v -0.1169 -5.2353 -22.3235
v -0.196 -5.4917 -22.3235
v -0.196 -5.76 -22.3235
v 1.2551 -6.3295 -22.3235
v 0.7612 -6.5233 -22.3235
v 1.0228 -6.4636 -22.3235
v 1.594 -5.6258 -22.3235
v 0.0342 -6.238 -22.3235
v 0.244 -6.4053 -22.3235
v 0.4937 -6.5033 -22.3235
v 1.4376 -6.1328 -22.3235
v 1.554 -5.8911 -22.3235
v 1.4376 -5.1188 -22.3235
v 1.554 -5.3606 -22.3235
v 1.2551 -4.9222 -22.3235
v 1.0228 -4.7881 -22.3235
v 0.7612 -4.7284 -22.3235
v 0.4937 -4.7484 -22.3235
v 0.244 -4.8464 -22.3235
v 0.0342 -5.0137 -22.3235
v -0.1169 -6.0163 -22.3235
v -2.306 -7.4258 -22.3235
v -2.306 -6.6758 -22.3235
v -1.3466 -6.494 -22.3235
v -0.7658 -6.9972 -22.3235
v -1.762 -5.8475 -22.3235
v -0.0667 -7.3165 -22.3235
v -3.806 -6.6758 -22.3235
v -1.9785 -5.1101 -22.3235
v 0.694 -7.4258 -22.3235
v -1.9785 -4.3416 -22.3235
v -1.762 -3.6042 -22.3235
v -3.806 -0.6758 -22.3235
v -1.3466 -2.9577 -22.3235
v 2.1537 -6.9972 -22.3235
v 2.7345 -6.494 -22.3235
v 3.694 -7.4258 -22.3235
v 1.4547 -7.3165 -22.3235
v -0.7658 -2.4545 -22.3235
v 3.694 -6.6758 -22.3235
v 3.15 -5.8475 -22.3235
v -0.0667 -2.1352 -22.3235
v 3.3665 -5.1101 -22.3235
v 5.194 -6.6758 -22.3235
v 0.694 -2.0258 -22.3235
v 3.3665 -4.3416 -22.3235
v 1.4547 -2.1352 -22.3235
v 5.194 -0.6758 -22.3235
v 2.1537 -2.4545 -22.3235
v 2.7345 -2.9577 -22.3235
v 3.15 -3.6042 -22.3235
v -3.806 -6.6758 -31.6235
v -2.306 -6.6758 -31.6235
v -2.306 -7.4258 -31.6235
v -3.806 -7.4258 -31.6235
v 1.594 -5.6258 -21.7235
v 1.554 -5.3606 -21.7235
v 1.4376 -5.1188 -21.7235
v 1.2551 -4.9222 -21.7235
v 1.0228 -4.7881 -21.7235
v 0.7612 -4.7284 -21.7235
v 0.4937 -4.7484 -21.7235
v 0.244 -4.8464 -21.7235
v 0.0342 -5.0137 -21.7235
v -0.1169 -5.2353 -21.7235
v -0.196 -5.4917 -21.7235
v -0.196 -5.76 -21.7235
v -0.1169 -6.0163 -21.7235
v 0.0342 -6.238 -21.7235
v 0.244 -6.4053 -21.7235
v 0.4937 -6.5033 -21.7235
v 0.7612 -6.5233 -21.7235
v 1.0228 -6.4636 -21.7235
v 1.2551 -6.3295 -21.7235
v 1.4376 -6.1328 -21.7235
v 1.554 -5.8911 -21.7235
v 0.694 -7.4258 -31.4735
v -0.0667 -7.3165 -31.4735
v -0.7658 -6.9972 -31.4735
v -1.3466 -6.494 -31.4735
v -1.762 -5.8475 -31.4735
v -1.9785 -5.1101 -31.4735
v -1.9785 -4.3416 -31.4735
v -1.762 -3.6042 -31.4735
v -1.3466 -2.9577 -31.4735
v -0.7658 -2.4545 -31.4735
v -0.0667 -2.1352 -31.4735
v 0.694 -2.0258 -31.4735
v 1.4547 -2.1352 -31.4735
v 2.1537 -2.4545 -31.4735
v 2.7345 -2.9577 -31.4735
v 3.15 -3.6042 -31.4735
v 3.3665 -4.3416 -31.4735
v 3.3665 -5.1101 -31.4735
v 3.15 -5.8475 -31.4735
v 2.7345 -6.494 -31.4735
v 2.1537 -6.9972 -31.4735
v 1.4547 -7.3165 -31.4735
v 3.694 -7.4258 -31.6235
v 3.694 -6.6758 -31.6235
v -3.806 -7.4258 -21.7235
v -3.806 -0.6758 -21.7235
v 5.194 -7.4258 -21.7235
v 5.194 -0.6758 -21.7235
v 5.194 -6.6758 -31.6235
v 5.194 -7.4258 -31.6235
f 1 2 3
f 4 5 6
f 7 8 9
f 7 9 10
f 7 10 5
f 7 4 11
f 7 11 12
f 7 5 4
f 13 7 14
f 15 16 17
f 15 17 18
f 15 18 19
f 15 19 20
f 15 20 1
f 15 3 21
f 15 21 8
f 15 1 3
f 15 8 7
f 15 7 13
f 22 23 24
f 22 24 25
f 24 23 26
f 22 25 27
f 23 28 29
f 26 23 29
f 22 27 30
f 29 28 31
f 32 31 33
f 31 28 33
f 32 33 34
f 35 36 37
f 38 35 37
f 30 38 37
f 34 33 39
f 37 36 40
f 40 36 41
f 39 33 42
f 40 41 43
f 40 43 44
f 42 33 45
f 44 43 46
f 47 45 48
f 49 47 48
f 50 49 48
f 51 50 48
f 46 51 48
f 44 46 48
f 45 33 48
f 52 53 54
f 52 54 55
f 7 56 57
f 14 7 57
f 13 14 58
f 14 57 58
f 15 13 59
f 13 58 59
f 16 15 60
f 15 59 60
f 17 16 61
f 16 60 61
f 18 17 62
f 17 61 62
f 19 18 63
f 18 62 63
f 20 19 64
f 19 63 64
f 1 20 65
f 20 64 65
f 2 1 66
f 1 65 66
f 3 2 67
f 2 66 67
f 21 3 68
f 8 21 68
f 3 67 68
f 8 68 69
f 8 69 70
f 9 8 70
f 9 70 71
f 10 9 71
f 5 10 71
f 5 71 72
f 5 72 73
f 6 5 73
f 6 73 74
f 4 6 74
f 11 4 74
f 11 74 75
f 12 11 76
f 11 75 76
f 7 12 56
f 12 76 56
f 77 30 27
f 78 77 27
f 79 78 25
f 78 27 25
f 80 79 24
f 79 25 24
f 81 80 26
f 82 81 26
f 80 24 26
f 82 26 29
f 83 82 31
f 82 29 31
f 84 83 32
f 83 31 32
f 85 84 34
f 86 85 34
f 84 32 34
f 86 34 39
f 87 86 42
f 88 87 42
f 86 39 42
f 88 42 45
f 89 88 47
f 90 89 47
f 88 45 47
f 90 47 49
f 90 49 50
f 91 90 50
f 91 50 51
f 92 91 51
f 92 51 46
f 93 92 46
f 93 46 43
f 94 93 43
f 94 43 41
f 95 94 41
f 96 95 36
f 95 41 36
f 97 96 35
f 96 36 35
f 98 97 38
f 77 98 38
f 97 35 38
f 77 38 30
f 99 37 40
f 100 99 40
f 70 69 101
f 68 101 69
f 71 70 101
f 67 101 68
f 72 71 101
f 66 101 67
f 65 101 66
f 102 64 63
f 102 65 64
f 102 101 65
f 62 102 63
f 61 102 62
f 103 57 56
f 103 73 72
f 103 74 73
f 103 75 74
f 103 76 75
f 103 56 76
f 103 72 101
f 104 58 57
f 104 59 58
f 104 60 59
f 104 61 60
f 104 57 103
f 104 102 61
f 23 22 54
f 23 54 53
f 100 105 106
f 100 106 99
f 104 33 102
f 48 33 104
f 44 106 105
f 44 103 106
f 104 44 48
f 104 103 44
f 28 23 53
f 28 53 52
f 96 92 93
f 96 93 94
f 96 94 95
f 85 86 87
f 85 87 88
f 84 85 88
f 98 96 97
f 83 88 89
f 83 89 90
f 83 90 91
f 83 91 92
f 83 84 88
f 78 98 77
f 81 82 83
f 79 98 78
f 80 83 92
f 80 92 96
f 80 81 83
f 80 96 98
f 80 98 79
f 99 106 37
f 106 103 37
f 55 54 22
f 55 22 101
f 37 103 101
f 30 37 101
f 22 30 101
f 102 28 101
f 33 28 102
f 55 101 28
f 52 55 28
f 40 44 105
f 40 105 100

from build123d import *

# Parameters (mm, degrees)
SKETCH1_W           = 60
SKETCH1_H           = 45
BOSS_EXTRUDE1_DEPTH = 4
SKETCH2_W           = 10
SKETCH2_H           = 5
BOSS_EXTRUDE3_DEPTH = 62
SKETCH3_R           = 18
BOSS_EXTRUDE4_DEPTH = 61
SKETCH4_R           = 6
CUT_EXTRUDE1_DEPTH  = 4
SCALE1_SCALE        = 0.15


with BuildPart() as part:
    # Sketch1 → Boss-Extrude1 (new body)
    with BuildSketch(Plane.XY):
        with Locations((0.693972483, 0.258252113)):
            Rectangle(SKETCH1_W, SKETCH1_H)
    extrude(amount=BOSS_EXTRUDE1_DEPTH)

    # Sketch2 → Boss-Extrude3 (add)
    with BuildSketch(Plane(origin=(0, 0, 0), x_dir=(-1, 0, 0), z_dir=(0, 0, -1))):
        with Locations((-25.693972483, -19.741747887)):
            Rectangle(SKETCH2_W, SKETCH2_H)
        with Locations((24.306027517, -19.741747887)):
            Rectangle(SKETCH2_W, SKETCH2_H)
    extrude(amount=BOSS_EXTRUDE3_DEPTH)

    # Sketch3 → Boss-Extrude4 (add)
    with BuildSketch(Plane(origin=(0, 0, 0), x_dir=(-1, 0, 0), z_dir=(0, 0, -1))):
        with Locations(Location((-0.693972483, -4.241747887, 0), (0, 0, 270))):
            Circle(SKETCH3_R)
    extrude(amount=BOSS_EXTRUDE4_DEPTH)

    # Sketch4 → Cut-Extrude1 (cut)
    with BuildSketch(Plane.XY.offset(4)):
        with Locations((0.693972483, -10.241747887)):
            Circle(SKETCH4_R)
    extrude(amount=-CUT_EXTRUDE1_DEPTH, mode=Mode.SUBTRACT)


with BuildPart() as part_1:
    # Scale1: scaled about (0.693972483, -4.811264364, -26.262899062)
    add(part.part.scale(SCALE1_SCALE).moved(Location((0.589876611, -4.089574709, -22.323464203))))


solid = part_1.part
